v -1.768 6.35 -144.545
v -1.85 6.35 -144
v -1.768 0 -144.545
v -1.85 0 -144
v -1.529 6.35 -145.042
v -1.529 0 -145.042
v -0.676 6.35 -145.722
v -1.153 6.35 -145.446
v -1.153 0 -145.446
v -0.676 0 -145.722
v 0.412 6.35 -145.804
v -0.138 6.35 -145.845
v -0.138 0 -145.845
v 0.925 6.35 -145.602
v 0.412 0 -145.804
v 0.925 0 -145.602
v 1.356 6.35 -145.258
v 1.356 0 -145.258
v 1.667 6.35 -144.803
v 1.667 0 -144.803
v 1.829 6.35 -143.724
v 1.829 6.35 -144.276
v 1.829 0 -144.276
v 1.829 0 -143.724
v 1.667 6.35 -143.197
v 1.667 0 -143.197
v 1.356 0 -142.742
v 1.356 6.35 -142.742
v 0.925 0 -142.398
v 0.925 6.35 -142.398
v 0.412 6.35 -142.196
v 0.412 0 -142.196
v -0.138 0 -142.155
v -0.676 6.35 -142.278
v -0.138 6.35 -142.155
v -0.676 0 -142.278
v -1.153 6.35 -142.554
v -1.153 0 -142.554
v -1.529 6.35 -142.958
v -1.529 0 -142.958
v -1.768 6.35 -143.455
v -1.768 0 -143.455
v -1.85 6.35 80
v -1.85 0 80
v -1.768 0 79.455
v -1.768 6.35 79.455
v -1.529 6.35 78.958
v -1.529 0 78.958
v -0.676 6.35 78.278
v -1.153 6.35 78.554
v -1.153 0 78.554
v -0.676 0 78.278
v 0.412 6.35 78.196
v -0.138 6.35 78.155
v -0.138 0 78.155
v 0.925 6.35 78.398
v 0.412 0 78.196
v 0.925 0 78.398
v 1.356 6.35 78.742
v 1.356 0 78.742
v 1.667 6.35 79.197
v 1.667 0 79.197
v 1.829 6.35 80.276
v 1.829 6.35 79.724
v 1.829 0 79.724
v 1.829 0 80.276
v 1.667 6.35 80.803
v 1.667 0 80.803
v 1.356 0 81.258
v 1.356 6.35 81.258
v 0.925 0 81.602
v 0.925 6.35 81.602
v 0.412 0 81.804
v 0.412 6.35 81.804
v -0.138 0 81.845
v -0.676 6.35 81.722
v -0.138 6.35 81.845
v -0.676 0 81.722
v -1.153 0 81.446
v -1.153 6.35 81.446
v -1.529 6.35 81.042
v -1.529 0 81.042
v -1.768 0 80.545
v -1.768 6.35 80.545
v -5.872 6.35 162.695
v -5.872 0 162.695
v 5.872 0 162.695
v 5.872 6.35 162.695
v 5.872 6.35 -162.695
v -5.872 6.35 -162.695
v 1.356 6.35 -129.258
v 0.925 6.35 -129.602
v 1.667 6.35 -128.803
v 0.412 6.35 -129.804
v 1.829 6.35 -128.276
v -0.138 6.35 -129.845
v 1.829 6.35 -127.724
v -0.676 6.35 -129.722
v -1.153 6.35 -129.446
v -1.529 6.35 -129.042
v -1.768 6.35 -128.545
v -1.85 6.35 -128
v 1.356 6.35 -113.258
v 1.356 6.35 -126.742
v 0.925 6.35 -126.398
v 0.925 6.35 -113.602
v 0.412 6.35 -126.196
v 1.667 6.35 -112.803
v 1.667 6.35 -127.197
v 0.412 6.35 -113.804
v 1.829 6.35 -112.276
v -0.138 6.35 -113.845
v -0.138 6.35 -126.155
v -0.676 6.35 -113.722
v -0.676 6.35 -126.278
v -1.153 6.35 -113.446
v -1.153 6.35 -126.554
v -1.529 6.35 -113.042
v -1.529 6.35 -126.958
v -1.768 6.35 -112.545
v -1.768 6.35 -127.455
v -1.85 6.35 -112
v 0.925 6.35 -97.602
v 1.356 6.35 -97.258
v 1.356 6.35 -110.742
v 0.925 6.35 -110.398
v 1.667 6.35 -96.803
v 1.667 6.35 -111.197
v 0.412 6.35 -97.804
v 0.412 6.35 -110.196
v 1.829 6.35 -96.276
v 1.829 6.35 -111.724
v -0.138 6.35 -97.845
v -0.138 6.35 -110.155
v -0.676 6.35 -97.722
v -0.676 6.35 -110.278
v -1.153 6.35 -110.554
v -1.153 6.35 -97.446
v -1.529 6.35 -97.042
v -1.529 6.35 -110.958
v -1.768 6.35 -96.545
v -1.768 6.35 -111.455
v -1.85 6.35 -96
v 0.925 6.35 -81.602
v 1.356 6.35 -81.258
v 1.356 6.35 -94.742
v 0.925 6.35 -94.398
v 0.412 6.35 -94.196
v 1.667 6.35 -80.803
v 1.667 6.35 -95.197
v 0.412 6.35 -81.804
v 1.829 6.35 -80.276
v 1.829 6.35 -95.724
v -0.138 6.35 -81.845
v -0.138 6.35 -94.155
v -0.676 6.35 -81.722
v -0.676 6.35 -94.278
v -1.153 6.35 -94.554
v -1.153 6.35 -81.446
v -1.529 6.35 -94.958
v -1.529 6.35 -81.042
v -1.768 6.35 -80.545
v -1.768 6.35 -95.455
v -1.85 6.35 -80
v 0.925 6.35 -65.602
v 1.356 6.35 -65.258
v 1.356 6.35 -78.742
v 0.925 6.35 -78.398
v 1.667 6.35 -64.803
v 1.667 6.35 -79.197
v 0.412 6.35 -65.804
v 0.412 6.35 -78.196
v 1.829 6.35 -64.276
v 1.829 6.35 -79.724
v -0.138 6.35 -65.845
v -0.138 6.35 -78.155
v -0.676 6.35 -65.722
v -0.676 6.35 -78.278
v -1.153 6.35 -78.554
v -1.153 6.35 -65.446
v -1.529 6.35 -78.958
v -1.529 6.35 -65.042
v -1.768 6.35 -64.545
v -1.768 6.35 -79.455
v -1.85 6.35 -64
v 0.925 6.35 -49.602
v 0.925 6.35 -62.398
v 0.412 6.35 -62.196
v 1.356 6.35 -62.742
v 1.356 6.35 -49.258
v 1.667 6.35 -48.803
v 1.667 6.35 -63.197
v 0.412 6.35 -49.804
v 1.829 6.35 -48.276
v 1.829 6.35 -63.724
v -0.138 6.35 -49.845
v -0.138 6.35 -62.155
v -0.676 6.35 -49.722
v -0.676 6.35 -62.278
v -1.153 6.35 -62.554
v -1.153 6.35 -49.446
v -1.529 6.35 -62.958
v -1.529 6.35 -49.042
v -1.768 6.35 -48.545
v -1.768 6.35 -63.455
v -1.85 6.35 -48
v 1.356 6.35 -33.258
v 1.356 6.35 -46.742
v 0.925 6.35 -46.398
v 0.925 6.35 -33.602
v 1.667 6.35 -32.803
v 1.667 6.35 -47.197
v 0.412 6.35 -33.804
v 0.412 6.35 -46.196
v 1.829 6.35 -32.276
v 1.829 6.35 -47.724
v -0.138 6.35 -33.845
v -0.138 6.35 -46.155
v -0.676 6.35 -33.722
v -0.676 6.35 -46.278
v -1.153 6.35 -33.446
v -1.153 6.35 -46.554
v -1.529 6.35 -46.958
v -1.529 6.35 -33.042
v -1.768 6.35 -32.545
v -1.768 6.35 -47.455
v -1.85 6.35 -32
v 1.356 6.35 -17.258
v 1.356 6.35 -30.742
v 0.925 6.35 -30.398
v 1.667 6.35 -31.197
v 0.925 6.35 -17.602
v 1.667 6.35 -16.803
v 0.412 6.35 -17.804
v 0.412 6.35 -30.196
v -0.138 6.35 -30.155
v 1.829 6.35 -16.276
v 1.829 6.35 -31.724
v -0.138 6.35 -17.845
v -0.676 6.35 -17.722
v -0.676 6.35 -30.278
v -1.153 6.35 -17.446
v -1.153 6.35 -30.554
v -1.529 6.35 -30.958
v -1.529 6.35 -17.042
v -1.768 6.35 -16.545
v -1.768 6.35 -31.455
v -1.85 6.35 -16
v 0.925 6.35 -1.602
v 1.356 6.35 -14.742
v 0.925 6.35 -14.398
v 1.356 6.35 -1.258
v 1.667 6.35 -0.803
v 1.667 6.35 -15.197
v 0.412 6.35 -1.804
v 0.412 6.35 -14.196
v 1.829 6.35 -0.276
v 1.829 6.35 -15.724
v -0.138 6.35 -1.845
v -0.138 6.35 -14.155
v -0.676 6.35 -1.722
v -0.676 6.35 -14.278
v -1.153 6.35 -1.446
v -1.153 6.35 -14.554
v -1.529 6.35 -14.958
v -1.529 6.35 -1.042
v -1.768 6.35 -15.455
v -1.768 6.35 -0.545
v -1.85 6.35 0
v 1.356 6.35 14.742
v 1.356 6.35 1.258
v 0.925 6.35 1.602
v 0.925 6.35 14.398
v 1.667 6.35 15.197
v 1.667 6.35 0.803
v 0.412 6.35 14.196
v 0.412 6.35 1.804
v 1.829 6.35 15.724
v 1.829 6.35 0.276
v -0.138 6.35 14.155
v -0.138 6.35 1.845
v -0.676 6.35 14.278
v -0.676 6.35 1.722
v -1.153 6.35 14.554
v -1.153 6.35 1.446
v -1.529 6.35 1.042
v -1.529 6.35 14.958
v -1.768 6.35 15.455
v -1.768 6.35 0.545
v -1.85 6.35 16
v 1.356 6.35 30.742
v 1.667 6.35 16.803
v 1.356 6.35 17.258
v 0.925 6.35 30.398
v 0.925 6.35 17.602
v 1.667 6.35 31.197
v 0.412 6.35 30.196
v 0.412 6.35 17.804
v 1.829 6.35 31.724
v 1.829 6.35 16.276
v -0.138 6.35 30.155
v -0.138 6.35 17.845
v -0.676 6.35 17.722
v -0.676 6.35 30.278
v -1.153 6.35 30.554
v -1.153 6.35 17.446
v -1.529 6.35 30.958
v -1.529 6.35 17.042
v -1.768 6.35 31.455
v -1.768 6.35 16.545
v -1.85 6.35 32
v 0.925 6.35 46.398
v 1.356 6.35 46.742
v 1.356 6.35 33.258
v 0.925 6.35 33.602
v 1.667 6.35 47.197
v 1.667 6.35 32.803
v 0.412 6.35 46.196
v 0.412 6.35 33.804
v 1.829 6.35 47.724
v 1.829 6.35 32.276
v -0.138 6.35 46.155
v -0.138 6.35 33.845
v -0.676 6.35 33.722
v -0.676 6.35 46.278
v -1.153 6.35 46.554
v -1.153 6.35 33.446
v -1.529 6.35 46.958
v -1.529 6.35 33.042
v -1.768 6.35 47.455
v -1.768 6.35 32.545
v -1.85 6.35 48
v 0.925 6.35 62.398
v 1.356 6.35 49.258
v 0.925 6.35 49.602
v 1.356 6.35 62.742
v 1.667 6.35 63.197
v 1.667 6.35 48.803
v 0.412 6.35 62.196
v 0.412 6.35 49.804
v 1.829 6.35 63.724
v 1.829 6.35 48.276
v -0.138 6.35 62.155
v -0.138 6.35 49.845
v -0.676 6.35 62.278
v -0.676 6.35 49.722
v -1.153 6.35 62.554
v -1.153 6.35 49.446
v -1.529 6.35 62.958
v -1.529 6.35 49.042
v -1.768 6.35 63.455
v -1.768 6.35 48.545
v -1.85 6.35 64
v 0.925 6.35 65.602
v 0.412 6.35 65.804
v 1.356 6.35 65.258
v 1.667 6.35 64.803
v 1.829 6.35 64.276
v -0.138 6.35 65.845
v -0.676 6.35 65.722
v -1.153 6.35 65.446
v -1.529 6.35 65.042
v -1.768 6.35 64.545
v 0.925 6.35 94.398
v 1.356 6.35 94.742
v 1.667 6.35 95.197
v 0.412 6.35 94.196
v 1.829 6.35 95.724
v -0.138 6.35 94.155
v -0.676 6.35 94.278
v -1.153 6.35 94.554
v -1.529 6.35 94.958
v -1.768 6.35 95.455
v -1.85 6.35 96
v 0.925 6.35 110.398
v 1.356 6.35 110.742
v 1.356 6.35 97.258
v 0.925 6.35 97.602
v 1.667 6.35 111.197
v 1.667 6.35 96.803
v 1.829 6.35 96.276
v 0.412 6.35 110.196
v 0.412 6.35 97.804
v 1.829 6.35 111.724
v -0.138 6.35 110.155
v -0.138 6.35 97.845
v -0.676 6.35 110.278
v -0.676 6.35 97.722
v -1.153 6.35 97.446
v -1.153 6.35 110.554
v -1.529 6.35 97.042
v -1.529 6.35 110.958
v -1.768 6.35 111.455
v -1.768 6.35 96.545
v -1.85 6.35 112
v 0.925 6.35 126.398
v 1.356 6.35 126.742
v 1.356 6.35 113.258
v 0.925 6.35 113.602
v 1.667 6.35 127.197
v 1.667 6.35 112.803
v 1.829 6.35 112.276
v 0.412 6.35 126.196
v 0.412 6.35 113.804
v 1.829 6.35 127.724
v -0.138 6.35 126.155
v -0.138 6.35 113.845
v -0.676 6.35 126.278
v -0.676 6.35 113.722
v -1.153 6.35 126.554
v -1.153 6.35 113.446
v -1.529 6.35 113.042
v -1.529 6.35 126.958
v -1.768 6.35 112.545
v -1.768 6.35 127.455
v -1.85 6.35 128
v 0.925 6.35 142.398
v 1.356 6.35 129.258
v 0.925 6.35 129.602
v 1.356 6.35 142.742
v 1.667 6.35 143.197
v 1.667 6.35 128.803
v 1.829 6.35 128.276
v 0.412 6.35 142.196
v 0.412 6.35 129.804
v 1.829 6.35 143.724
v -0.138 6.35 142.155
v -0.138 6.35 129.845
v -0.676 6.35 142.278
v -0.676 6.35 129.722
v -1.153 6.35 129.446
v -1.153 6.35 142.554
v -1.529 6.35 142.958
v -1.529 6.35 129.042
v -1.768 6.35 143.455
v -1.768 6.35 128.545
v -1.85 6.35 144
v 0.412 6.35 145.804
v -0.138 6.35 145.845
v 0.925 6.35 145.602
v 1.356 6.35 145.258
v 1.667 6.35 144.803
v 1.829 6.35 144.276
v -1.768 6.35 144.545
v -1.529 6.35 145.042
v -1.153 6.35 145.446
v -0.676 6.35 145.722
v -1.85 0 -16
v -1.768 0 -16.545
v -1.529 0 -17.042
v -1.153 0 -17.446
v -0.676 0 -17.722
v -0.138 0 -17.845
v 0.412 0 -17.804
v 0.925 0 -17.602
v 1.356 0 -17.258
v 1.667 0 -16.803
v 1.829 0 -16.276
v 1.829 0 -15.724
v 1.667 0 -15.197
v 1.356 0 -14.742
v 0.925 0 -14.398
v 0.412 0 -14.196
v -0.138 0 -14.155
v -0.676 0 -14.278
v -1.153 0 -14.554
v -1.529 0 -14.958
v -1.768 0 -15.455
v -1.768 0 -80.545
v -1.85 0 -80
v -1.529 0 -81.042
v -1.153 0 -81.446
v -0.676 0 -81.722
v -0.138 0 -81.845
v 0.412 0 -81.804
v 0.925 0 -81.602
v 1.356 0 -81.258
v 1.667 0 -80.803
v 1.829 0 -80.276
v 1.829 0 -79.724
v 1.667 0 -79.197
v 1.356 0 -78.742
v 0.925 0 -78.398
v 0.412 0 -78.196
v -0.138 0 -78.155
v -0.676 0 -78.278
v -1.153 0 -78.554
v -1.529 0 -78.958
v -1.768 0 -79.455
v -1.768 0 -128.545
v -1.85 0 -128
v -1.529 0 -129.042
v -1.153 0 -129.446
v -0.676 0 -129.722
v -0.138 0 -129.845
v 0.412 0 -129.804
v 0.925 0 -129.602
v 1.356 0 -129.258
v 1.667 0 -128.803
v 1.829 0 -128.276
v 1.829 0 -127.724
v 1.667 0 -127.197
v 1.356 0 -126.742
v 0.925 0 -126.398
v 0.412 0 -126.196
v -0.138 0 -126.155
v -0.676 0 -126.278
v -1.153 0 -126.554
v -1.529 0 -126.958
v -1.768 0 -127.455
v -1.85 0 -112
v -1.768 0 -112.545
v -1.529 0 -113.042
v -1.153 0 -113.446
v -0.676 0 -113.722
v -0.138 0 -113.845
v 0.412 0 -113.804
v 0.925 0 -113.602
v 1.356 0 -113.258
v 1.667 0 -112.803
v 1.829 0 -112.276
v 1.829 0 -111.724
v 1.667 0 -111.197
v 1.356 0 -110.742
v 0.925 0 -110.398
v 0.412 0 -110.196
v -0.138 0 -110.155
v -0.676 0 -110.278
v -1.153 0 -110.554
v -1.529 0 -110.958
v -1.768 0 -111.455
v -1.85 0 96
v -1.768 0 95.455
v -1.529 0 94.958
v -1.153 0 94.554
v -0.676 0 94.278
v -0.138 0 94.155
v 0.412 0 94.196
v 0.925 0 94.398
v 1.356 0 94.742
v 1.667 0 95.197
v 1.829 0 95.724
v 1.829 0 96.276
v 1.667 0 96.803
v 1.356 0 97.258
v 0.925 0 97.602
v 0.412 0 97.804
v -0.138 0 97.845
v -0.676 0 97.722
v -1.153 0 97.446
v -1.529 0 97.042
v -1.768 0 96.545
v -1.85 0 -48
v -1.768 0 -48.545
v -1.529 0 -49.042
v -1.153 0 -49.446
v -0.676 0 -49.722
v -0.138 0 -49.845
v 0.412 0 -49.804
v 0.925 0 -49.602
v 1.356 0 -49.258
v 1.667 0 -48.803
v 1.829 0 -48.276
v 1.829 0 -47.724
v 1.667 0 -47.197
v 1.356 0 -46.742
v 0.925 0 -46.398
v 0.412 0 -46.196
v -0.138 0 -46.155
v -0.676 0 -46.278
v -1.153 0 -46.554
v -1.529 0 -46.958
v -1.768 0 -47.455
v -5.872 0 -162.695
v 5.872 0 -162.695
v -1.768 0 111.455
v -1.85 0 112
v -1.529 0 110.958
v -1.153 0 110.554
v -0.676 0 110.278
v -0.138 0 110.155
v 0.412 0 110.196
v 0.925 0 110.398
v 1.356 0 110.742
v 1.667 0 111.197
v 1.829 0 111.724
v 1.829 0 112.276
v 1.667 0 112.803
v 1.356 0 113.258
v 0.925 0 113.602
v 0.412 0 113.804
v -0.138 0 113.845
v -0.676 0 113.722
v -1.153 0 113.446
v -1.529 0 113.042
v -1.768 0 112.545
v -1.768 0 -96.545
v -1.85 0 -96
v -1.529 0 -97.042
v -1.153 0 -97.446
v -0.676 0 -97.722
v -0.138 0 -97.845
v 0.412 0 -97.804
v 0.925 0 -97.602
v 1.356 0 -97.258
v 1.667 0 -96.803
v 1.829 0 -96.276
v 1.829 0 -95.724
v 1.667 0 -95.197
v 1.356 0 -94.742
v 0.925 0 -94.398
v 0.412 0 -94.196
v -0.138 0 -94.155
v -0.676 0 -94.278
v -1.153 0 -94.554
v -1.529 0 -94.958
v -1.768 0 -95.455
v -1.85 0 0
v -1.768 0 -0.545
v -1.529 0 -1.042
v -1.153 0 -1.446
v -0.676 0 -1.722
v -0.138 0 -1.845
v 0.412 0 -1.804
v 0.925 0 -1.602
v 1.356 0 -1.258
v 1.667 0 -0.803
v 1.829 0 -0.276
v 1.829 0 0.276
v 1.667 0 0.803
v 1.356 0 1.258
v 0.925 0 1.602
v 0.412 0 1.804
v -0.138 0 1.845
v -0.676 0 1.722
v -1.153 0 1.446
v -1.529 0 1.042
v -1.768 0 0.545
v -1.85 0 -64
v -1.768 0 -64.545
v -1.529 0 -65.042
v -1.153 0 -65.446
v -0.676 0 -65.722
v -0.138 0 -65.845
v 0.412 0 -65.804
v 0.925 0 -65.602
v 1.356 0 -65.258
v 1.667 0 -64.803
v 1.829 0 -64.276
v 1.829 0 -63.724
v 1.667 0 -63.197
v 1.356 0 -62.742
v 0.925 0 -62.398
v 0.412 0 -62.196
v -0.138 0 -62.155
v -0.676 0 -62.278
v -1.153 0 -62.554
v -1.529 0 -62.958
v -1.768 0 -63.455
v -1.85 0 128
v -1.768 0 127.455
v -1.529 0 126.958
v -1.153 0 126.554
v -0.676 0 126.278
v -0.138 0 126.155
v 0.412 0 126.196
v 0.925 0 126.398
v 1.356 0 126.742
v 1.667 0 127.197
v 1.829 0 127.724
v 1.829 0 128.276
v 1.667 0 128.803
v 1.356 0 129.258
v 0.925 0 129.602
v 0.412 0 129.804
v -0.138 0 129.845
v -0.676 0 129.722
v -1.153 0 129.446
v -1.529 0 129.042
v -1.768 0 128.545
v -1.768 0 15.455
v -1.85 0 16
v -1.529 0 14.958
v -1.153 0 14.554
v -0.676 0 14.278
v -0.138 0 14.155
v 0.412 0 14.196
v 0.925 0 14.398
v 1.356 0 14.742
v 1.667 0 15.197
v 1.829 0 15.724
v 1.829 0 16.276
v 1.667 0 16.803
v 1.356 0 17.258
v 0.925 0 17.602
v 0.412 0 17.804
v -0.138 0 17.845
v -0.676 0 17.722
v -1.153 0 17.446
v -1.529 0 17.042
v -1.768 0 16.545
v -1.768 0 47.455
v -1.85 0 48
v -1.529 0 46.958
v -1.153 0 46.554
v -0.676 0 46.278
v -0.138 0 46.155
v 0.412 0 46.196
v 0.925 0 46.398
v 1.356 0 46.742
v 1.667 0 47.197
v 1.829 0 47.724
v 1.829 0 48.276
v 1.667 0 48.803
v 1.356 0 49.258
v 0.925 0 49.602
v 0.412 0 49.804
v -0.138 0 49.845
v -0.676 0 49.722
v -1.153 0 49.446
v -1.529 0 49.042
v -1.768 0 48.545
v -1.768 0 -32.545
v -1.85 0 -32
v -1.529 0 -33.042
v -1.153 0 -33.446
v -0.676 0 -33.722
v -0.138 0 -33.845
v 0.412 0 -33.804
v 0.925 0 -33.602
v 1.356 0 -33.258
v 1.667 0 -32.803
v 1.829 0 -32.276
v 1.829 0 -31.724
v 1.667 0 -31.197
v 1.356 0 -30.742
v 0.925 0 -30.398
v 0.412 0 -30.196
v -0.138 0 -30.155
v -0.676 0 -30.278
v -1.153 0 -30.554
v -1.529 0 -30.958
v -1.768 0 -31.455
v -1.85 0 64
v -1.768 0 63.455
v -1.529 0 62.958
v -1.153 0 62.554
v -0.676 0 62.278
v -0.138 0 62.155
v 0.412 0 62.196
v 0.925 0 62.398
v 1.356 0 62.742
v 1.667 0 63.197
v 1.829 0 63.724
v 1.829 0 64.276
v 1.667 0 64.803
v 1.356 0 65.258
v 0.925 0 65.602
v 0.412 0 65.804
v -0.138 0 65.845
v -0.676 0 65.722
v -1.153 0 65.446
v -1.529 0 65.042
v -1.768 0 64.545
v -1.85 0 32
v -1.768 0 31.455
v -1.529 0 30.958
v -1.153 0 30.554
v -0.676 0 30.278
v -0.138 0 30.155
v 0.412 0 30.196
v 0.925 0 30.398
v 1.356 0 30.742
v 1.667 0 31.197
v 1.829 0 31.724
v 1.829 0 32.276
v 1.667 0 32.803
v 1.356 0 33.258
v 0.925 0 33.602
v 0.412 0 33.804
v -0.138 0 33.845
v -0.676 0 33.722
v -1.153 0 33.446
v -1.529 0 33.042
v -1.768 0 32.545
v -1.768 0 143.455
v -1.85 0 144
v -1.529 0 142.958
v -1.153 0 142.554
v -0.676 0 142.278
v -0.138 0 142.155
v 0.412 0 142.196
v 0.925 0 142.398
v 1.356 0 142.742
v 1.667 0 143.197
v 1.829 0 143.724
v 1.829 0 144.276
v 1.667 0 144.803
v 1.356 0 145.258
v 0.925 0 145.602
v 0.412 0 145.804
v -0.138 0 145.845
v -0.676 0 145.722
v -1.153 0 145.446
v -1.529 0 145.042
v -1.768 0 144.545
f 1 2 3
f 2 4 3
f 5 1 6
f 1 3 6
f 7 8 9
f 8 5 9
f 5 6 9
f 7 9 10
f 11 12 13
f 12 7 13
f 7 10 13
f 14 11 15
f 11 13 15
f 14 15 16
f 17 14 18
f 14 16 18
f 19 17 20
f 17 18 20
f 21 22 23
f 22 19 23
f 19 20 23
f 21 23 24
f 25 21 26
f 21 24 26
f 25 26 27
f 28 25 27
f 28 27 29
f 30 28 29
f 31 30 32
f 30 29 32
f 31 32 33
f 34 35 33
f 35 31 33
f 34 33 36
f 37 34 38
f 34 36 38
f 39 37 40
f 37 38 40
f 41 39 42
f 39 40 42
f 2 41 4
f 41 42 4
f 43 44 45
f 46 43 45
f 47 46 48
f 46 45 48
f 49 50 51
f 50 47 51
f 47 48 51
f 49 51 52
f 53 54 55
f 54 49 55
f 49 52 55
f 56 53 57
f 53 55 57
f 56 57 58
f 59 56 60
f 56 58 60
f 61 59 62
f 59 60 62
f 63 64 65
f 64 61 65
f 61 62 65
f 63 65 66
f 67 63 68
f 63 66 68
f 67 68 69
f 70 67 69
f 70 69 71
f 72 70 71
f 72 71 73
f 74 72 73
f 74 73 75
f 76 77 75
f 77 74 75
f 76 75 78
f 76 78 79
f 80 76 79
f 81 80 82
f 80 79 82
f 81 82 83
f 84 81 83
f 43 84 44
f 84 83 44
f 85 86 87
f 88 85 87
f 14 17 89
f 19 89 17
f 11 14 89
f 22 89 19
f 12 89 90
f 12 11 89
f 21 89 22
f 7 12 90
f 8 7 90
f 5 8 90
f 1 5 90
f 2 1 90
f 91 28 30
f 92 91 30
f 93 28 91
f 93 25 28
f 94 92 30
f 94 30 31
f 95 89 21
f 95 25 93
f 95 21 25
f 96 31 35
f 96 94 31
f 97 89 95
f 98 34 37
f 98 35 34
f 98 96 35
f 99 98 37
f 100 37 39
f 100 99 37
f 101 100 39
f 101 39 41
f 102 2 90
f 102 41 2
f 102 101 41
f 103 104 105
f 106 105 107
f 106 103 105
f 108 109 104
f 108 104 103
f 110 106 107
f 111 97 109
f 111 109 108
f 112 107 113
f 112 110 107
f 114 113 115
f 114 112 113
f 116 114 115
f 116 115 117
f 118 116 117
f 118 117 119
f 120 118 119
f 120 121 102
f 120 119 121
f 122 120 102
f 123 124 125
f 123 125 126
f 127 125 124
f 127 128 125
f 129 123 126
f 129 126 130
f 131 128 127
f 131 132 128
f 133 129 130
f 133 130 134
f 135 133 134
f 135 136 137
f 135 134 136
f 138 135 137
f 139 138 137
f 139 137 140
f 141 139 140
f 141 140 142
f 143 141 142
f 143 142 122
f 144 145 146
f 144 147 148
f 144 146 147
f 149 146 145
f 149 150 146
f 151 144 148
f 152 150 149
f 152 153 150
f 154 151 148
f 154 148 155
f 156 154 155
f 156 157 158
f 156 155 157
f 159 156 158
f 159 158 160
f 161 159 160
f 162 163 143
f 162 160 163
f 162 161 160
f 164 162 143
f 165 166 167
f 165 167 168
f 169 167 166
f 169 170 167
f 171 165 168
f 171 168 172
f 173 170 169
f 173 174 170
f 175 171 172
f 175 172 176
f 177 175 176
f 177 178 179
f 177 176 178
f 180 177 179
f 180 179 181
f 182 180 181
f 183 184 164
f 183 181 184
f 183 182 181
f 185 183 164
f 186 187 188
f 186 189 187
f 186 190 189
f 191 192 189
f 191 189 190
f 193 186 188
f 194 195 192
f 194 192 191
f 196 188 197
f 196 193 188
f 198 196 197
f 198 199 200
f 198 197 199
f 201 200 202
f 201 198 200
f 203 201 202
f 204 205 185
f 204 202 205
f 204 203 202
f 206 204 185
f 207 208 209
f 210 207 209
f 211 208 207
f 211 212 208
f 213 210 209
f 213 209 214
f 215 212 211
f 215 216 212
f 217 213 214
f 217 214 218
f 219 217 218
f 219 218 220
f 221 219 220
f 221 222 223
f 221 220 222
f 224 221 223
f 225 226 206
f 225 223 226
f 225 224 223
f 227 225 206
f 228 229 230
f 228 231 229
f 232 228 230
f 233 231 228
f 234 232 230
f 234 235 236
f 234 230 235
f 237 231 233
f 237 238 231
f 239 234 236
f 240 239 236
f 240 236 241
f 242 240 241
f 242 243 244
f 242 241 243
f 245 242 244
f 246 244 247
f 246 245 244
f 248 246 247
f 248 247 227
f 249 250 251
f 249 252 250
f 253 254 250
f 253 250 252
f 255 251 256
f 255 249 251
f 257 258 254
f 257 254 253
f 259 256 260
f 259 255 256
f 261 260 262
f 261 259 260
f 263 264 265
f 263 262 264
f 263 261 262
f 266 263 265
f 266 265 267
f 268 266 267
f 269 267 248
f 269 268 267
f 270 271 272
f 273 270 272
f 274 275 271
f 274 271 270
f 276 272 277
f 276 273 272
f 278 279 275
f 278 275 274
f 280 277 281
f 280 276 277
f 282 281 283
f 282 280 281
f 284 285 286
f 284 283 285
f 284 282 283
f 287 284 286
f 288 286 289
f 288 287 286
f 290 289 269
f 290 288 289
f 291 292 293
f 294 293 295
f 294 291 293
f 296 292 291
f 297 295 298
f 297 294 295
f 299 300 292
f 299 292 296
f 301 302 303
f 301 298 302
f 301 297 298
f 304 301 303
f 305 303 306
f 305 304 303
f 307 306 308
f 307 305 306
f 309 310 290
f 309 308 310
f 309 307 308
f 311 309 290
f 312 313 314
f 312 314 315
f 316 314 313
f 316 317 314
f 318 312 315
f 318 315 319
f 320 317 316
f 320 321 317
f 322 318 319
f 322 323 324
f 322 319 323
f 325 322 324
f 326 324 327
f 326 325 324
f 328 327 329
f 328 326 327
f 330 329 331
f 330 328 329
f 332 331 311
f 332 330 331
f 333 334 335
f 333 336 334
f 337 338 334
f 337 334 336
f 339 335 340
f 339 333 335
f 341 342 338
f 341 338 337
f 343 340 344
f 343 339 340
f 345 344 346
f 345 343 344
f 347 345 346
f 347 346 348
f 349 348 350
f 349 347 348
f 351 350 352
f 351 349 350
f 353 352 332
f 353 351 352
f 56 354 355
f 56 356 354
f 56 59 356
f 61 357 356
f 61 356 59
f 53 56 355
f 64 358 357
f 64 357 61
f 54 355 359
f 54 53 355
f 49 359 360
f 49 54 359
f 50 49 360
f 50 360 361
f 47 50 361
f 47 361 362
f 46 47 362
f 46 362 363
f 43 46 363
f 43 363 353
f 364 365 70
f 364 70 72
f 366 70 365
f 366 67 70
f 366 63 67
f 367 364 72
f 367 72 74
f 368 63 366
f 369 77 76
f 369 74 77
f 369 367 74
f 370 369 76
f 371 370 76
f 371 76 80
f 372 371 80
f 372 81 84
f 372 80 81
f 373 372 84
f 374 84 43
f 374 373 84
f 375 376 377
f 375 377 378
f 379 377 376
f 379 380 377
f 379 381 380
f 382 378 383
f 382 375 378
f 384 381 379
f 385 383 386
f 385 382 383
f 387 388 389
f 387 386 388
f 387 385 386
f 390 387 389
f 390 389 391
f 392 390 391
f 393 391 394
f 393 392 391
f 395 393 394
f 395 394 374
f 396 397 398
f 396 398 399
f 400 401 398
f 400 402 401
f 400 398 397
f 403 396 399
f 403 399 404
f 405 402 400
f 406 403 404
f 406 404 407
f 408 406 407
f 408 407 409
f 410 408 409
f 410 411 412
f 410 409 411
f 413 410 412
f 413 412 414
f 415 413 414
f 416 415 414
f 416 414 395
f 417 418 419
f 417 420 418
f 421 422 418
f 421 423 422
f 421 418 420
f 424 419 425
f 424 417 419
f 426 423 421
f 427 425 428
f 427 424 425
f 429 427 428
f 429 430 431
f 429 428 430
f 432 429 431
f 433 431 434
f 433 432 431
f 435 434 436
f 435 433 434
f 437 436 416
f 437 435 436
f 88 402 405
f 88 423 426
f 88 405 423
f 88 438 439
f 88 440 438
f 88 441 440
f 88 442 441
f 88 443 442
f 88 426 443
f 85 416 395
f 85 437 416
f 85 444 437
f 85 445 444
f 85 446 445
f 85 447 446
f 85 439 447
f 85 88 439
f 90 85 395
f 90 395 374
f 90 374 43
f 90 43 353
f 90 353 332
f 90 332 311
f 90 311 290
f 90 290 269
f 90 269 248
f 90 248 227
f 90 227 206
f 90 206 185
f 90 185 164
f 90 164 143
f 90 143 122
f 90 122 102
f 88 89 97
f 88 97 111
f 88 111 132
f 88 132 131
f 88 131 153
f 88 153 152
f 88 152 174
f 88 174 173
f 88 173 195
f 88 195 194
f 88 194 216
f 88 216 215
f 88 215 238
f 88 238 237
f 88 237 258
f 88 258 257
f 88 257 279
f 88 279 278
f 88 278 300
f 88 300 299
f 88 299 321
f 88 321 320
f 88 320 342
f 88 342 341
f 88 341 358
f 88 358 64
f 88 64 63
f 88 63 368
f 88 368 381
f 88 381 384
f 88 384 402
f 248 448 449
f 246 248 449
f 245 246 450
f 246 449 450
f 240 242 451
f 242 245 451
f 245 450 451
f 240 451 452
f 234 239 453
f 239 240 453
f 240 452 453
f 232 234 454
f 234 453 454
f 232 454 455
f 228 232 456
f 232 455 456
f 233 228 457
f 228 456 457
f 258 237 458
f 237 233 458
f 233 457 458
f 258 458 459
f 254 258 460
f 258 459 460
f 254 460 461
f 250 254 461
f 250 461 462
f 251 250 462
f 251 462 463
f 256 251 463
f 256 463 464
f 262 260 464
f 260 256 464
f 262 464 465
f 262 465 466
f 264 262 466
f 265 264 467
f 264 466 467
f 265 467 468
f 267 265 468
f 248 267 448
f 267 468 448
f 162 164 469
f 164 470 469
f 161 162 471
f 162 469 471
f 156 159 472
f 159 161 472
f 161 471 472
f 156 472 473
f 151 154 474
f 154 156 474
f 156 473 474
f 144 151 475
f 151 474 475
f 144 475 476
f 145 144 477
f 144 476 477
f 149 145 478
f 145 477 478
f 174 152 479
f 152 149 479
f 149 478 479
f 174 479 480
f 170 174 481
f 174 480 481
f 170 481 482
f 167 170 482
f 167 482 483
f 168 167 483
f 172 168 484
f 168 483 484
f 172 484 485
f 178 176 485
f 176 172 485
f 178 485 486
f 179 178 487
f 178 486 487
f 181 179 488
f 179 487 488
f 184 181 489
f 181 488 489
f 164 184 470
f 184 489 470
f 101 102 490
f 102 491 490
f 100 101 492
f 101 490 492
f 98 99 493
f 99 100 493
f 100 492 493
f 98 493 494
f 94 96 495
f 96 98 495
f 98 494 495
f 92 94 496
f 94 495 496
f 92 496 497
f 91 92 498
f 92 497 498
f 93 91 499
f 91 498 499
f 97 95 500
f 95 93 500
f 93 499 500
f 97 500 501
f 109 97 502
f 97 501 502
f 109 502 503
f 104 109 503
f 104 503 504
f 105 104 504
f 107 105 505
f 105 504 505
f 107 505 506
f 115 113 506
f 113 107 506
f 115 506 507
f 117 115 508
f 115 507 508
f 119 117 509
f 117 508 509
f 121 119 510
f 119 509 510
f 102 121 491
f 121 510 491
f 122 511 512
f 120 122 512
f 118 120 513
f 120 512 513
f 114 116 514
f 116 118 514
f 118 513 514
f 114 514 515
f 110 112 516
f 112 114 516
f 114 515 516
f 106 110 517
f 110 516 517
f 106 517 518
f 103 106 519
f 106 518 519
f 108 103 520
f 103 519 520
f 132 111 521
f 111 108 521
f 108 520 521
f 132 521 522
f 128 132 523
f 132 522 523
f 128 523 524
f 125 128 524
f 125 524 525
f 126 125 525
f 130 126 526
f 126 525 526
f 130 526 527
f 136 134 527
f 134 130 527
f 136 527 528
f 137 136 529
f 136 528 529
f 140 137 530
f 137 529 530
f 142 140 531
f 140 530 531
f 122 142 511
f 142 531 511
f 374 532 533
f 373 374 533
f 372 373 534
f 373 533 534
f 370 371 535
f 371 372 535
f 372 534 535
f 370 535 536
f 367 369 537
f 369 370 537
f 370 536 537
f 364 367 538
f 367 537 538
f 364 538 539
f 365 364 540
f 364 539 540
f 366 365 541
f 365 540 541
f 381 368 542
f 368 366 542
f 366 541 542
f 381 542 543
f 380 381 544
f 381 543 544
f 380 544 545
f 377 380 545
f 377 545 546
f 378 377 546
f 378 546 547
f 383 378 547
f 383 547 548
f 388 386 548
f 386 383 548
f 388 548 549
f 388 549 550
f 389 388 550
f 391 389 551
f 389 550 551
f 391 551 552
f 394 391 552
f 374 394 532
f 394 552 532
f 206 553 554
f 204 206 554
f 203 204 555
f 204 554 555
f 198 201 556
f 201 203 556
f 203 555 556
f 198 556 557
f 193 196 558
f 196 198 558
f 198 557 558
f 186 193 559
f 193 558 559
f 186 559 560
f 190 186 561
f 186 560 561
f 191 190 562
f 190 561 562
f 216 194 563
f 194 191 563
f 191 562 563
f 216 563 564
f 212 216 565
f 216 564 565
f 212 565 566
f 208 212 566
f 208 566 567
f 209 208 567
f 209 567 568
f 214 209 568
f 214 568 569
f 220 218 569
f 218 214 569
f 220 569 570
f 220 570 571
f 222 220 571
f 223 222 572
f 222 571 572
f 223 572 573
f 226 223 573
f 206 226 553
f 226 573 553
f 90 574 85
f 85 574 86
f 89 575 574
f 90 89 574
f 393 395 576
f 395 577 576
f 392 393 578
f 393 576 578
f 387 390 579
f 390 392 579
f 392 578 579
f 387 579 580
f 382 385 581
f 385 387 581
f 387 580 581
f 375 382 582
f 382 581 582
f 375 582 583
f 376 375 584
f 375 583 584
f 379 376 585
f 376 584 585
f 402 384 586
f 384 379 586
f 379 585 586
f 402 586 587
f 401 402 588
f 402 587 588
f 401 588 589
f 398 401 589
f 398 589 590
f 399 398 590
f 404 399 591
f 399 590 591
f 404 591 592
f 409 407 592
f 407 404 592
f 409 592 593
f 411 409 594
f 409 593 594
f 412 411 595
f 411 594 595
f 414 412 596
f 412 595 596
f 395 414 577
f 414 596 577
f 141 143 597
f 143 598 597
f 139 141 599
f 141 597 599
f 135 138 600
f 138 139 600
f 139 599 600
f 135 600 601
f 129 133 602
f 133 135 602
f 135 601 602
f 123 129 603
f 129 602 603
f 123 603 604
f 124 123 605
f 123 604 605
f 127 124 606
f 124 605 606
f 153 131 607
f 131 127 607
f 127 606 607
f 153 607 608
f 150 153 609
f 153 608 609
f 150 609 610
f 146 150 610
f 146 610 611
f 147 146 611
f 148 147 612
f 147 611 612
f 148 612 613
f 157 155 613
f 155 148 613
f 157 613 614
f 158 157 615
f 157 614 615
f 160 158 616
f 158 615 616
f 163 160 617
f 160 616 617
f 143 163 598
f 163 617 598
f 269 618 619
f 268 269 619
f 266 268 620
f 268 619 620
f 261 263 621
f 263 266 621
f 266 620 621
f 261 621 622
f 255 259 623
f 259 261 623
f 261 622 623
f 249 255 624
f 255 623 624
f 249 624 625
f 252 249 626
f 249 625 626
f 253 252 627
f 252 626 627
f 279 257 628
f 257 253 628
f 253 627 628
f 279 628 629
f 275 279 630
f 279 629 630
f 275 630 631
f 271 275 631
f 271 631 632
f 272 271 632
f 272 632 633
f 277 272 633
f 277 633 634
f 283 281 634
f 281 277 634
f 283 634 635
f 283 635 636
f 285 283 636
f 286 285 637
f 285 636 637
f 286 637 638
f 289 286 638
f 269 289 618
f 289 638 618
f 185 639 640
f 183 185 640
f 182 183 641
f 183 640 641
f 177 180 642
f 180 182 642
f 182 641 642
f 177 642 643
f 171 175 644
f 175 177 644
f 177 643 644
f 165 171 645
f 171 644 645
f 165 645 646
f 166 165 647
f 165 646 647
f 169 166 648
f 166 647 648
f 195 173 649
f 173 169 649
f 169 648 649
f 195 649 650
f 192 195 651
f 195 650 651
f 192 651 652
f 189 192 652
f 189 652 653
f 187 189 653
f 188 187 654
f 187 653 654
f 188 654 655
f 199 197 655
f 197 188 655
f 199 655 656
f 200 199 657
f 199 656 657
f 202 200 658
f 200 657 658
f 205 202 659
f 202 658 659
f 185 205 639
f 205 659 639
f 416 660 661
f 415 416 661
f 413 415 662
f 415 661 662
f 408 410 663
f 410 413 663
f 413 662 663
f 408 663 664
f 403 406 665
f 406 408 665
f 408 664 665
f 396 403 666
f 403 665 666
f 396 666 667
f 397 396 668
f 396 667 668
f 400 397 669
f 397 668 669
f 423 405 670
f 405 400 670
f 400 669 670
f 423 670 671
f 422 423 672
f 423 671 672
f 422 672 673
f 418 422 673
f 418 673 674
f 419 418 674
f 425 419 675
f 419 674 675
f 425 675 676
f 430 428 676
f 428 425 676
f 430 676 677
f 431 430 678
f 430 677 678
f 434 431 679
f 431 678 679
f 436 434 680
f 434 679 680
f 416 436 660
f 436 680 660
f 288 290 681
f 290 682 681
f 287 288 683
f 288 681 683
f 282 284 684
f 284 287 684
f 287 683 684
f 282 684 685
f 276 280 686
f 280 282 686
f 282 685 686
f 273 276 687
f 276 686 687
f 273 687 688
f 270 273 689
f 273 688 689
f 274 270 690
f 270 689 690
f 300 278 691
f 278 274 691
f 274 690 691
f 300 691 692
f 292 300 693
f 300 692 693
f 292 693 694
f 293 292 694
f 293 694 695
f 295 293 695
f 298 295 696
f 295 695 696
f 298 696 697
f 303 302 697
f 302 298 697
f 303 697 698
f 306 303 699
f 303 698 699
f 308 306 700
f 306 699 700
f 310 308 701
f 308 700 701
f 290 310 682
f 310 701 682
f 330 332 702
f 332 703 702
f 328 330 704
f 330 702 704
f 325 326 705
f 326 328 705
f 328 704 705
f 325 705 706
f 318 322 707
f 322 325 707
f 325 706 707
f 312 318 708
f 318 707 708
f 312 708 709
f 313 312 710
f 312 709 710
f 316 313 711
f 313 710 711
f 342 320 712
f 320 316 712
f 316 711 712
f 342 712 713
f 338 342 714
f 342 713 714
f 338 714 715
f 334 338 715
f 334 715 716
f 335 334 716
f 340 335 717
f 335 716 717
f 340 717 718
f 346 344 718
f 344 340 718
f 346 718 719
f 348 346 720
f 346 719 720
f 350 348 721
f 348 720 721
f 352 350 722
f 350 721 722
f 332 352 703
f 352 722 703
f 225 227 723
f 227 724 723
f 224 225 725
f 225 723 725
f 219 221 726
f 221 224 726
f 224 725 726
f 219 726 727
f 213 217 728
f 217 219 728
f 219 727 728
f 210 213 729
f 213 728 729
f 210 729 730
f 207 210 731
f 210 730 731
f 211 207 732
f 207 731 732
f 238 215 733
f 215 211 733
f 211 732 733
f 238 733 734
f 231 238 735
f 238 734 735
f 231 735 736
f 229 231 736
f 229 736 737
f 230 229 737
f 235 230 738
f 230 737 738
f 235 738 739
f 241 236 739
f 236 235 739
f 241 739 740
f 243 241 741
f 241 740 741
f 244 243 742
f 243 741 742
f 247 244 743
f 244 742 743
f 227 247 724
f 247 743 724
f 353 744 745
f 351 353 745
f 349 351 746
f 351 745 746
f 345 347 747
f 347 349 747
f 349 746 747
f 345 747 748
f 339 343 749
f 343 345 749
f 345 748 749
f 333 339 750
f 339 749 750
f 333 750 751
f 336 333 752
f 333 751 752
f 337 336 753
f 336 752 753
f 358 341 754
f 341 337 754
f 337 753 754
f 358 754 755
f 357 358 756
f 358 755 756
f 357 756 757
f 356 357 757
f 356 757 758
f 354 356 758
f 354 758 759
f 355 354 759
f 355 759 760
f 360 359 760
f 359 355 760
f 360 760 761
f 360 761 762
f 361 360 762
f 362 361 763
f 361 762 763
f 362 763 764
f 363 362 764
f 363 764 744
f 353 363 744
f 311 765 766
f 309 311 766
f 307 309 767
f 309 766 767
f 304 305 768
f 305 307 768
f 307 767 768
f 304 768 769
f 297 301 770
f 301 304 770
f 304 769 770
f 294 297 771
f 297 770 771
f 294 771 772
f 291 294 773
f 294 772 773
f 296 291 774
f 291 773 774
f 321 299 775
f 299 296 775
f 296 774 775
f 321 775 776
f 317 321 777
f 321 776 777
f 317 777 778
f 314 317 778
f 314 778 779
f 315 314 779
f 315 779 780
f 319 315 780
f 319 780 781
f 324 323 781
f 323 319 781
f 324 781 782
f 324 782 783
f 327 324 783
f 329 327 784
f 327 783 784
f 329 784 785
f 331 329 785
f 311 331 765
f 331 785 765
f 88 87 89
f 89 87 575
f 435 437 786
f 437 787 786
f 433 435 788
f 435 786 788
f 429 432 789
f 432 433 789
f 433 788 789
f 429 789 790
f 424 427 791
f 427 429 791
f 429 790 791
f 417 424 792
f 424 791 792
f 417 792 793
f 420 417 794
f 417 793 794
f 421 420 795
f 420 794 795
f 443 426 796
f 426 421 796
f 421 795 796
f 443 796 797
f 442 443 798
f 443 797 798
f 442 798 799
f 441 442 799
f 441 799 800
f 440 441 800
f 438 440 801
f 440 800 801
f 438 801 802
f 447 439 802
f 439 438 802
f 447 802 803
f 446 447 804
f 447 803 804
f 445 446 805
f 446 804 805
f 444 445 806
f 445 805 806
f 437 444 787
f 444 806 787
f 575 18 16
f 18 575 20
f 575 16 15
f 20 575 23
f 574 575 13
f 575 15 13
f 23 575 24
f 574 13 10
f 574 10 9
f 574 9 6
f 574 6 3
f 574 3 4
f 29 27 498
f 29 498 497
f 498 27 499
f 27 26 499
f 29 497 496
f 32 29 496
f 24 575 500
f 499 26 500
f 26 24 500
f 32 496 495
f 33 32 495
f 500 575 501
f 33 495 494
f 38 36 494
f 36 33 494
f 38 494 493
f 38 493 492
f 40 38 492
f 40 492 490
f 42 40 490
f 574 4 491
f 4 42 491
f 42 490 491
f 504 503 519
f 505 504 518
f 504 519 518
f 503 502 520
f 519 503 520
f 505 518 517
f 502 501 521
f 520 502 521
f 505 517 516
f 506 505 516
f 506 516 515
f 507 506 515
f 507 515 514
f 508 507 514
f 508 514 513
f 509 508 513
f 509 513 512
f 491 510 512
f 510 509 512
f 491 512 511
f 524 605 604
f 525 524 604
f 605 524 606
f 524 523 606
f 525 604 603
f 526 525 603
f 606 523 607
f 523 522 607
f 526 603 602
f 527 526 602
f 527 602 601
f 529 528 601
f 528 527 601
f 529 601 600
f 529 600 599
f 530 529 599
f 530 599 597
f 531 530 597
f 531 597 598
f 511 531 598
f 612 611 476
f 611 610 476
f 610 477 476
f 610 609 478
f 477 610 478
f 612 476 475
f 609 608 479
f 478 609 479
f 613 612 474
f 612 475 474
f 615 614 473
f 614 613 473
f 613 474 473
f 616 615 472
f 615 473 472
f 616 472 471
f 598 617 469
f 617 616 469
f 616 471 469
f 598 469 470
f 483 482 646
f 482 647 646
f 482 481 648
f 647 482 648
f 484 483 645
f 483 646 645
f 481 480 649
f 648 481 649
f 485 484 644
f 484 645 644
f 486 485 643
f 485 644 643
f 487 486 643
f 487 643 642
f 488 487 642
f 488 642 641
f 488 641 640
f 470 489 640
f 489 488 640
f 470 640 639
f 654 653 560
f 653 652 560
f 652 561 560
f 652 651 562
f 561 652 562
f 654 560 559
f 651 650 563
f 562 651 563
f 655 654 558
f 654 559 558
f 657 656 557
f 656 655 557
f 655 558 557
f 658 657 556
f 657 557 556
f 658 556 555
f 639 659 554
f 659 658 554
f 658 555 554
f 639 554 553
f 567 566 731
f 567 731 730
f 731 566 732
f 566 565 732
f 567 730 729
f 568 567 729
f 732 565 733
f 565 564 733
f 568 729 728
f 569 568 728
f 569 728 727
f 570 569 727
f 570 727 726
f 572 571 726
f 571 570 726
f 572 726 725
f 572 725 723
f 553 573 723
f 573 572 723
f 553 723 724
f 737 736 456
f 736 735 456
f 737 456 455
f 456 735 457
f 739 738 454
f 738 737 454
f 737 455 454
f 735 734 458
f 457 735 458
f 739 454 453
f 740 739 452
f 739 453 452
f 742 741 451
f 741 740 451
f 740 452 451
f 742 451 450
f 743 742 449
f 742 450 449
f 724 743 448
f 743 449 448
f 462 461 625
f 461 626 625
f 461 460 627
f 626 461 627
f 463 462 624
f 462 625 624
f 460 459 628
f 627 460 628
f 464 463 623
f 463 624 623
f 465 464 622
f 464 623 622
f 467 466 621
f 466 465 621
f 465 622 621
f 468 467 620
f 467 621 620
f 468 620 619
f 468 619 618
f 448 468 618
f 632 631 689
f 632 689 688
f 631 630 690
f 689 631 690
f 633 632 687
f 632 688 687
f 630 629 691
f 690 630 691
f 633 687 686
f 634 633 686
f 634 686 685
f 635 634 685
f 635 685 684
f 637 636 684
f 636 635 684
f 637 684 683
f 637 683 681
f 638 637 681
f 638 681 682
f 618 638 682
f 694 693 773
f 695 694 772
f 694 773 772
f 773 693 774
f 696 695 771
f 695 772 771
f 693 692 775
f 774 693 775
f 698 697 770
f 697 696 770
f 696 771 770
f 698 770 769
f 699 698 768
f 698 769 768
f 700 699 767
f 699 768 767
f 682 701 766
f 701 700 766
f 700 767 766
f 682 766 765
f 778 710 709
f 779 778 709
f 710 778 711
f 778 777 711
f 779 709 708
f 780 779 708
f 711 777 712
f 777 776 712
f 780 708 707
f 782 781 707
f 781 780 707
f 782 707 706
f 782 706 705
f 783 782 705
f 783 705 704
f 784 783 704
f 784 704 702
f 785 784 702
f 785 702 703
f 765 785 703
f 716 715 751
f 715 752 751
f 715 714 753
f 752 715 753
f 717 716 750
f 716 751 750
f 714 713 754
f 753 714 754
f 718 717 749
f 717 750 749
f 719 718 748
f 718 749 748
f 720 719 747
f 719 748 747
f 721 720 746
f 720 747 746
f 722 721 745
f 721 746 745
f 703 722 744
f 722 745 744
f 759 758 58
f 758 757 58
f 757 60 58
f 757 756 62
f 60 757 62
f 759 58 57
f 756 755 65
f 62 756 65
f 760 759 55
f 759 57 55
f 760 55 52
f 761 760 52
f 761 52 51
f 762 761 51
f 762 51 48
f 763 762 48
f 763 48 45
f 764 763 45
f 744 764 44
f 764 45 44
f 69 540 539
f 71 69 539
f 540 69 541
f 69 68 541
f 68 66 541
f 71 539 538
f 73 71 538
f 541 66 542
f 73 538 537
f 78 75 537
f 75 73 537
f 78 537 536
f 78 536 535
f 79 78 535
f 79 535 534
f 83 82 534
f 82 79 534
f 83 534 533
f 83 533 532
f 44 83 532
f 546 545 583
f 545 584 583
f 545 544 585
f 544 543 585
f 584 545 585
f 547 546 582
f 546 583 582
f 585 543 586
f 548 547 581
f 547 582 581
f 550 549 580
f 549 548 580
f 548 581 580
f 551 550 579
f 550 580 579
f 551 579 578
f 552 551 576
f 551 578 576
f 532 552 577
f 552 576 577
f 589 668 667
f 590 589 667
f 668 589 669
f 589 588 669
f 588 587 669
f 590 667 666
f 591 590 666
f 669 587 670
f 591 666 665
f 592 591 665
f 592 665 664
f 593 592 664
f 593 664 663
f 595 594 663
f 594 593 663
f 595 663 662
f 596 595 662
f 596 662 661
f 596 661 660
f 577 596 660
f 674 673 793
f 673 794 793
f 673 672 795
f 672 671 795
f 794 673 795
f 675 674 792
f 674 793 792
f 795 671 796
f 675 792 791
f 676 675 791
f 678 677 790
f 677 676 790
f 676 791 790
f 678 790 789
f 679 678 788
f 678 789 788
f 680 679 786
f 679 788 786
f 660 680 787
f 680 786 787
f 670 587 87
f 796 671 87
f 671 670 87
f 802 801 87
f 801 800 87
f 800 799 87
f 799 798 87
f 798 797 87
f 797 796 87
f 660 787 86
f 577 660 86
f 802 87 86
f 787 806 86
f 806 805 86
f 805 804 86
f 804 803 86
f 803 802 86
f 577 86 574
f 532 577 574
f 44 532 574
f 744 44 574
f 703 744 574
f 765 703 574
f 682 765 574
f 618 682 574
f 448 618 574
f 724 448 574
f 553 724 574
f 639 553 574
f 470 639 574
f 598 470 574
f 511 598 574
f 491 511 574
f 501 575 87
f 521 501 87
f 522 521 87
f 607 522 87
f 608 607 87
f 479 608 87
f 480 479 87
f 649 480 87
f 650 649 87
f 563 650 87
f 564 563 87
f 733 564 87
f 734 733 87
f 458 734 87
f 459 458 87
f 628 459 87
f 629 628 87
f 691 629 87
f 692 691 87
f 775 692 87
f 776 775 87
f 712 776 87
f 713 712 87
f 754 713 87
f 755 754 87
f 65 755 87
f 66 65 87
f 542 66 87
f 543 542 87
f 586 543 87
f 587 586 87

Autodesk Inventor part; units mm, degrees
ref_plane "YZ Plane" through (0, 0, 0) normal (1, 0, 0) x (0, 1, 0)
ref_plane "XZ Plane" through (0, 0, 0) normal (0, 1, 0) x (-1, 0, 0)
ref_plane "XY Plane" through (0, 0, 0) normal (0, 0, 1) x (1, 0, 0)
sketch "Sketch1" plane through (0, 0, 0) normal (0, 1, 0) x (-1, 0, 0)
  line L0 (5.872, 162.6948) -> (-5.872, 162.6948)
  line L1 (-5.872, 162.6948) -> (-5.872, -162.6948)
  line L2 (-5.872, -162.6948) -> (5.872, -162.6948)
  line L3 (5.872, -162.6948) -> (5.872, 162.6948)
  line L4 (5.872, 162.6948) -> (-5.872, -162.6948) construction
  line L5 (-5.872, 162.6948) -> (5.872, -162.6948) construction
  circle A0 centre (0, 0) radius 1.85
  circle A1 centre (0, 16) radius 1.85
  circle A2 centre (0, 32) radius 1.85
  circle A3 centre (0, 48) radius 1.85
  circle A4 centre (0, 64) radius 1.85
  circle A5 centre (0, 80) radius 1.85
  circle A6 centre (0, 96) radius 1.85
  circle A7 centre (0, 112) radius 1.85
  circle A8 centre (0, 128) radius 1.85
  circle A9 centre (0, 144) radius 1.85
  circle A10 centre (0, -16) radius 1.85
  circle A11 centre (0, 0) radius 1.85
  circle A12 centre (0, 16) radius 1.85
  circle A13 centre (0, 32) radius 1.85
  circle A14 centre (0, 48) radius 1.85
  circle A15 centre (0, 64) radius 1.85
  circle A16 centre (0, 80) radius 1.85
  circle A17 centre (0, 96) radius 1.85
  circle A18 centre (0, 112) radius 1.85
  circle A19 centre (0, 128) radius 1.85
  circle A20 centre (0, -32) radius 1.85
  circle A21 centre (0, -16) radius 1.85
  circle A22 centre (0, 0) radius 1.85
  circle A23 centre (0, 16) radius 1.85
  circle A24 centre (0, 32) radius 1.85
  circle A25 centre (0, 48) radius 1.85
  circle A26 centre (0, 64) radius 1.85
  circle A27 centre (0, 80) radius 1.85
  circle A28 centre (0, 96) radius 1.85
  circle A29 centre (0, 112) radius 1.85
  circle A30 centre (0, -48) radius 1.85
  circle A31 centre (0, -32) radius 1.85
  circle A32 centre (0, -16) radius 1.85
  circle A33 centre (0, 0) radius 1.85
  circle A34 centre (0, 16) radius 1.85
  circle A35 centre (0, 32) radius 1.85
  circle A36 centre (0, 48) radius 1.85
  circle A37 centre (0, 64) radius 1.85
  circle A38 centre (0, 80) radius 1.85
  circle A39 centre (0, 96) radius 1.85
  circle A40 centre (0, -64) radius 1.85
  circle A41 centre (0, -48) radius 1.85
  circle A42 centre (0, -32) radius 1.85
  circle A43 centre (0, -16) radius 1.85
  circle A44 centre (0, 0) radius 1.85
  circle A45 centre (0, 16) radius 1.85
  circle A46 centre (0, 32) radius 1.85
  circle A47 centre (0, 48) radius 1.85
  circle A48 centre (0, 64) radius 1.85
  circle A49 centre (0, 80) radius 1.85
  circle A50 centre (0, -80) radius 1.85
  circle A51 centre (0, -64) radius 1.85
  circle A52 centre (0, -48) radius 1.85
  circle A53 centre (0, -32) radius 1.85
  circle A54 centre (0, -16) radius 1.85
  circle A55 centre (0, 0) radius 1.85
  circle A56 centre (0, 16) radius 1.85
  circle A57 centre (0, 32) radius 1.85
  circle A58 centre (0, 48) radius 1.85
  circle A59 centre (0, 64) radius 1.85
  circle A60 centre (0, -96) radius 1.85
  circle A61 centre (0, -80) radius 1.85
  circle A62 centre (0, -64) radius 1.85
  circle A63 centre (0, -48) radius 1.85
  circle A64 centre (0, -32) radius 1.85
  circle A65 centre (0, -16) radius 1.85
  circle A66 centre (0, 0) radius 1.85
  circle A67 centre (0, 16) radius 1.85
  circle A68 centre (0, 32) radius 1.85
  circle A69 centre (0, 48) radius 1.85
  circle A70 centre (0, -112) radius 1.85
  circle A71 centre (0, -96) radius 1.85
  circle A72 centre (0, -80) radius 1.85
  circle A73 centre (0, -64) radius 1.85
  circle A74 centre (0, -48) radius 1.85
  circle A75 centre (0, -32) radius 1.85
  circle A76 centre (0, -16) radius 1.85
  circle A77 centre (0, 0) radius 1.85
  circle A78 centre (0, 16) radius 1.85
  circle A79 centre (0, 32) radius 1.85
  circle A80 centre (0, -128) radius 1.85
  circle A81 centre (0, -112) radius 1.85
  circle A82 centre (0, -96) radius 1.85
  circle A83 centre (0, -80) radius 1.85
  circle A84 centre (0, -64) radius 1.85
  circle A85 centre (0, -48) radius 1.85
  circle A86 centre (0, -32) radius 1.85
  circle A87 centre (0, -16) radius 1.85
  circle A88 centre (0, 0) radius 1.85
  circle A89 centre (0, 16) radius 1.85
  circle A90 centre (0, -144) radius 1.85
  circle A91 centre (0, -128) radius 1.85
  circle A92 centre (0, -112) radius 1.85
  circle A93 centre (0, -96) radius 1.85
  circle A94 centre (0, -80) radius 1.85
  circle A95 centre (0, -64) radius 1.85
  circle A96 centre (0, -48) radius 1.85
  circle A97 centre (0, -32) radius 1.85
  circle A98 centre (0, -16) radius 1.85
  circle A99 centre (0, 0) radius 1.85
  dimension "d0" = 3.7
  dimension "d3" = 16
  dimension "d6" = 16
extrude "Extrusion1" add sketch "Sketch1" along normal blind 6.35
properties part number "ServoArm"
